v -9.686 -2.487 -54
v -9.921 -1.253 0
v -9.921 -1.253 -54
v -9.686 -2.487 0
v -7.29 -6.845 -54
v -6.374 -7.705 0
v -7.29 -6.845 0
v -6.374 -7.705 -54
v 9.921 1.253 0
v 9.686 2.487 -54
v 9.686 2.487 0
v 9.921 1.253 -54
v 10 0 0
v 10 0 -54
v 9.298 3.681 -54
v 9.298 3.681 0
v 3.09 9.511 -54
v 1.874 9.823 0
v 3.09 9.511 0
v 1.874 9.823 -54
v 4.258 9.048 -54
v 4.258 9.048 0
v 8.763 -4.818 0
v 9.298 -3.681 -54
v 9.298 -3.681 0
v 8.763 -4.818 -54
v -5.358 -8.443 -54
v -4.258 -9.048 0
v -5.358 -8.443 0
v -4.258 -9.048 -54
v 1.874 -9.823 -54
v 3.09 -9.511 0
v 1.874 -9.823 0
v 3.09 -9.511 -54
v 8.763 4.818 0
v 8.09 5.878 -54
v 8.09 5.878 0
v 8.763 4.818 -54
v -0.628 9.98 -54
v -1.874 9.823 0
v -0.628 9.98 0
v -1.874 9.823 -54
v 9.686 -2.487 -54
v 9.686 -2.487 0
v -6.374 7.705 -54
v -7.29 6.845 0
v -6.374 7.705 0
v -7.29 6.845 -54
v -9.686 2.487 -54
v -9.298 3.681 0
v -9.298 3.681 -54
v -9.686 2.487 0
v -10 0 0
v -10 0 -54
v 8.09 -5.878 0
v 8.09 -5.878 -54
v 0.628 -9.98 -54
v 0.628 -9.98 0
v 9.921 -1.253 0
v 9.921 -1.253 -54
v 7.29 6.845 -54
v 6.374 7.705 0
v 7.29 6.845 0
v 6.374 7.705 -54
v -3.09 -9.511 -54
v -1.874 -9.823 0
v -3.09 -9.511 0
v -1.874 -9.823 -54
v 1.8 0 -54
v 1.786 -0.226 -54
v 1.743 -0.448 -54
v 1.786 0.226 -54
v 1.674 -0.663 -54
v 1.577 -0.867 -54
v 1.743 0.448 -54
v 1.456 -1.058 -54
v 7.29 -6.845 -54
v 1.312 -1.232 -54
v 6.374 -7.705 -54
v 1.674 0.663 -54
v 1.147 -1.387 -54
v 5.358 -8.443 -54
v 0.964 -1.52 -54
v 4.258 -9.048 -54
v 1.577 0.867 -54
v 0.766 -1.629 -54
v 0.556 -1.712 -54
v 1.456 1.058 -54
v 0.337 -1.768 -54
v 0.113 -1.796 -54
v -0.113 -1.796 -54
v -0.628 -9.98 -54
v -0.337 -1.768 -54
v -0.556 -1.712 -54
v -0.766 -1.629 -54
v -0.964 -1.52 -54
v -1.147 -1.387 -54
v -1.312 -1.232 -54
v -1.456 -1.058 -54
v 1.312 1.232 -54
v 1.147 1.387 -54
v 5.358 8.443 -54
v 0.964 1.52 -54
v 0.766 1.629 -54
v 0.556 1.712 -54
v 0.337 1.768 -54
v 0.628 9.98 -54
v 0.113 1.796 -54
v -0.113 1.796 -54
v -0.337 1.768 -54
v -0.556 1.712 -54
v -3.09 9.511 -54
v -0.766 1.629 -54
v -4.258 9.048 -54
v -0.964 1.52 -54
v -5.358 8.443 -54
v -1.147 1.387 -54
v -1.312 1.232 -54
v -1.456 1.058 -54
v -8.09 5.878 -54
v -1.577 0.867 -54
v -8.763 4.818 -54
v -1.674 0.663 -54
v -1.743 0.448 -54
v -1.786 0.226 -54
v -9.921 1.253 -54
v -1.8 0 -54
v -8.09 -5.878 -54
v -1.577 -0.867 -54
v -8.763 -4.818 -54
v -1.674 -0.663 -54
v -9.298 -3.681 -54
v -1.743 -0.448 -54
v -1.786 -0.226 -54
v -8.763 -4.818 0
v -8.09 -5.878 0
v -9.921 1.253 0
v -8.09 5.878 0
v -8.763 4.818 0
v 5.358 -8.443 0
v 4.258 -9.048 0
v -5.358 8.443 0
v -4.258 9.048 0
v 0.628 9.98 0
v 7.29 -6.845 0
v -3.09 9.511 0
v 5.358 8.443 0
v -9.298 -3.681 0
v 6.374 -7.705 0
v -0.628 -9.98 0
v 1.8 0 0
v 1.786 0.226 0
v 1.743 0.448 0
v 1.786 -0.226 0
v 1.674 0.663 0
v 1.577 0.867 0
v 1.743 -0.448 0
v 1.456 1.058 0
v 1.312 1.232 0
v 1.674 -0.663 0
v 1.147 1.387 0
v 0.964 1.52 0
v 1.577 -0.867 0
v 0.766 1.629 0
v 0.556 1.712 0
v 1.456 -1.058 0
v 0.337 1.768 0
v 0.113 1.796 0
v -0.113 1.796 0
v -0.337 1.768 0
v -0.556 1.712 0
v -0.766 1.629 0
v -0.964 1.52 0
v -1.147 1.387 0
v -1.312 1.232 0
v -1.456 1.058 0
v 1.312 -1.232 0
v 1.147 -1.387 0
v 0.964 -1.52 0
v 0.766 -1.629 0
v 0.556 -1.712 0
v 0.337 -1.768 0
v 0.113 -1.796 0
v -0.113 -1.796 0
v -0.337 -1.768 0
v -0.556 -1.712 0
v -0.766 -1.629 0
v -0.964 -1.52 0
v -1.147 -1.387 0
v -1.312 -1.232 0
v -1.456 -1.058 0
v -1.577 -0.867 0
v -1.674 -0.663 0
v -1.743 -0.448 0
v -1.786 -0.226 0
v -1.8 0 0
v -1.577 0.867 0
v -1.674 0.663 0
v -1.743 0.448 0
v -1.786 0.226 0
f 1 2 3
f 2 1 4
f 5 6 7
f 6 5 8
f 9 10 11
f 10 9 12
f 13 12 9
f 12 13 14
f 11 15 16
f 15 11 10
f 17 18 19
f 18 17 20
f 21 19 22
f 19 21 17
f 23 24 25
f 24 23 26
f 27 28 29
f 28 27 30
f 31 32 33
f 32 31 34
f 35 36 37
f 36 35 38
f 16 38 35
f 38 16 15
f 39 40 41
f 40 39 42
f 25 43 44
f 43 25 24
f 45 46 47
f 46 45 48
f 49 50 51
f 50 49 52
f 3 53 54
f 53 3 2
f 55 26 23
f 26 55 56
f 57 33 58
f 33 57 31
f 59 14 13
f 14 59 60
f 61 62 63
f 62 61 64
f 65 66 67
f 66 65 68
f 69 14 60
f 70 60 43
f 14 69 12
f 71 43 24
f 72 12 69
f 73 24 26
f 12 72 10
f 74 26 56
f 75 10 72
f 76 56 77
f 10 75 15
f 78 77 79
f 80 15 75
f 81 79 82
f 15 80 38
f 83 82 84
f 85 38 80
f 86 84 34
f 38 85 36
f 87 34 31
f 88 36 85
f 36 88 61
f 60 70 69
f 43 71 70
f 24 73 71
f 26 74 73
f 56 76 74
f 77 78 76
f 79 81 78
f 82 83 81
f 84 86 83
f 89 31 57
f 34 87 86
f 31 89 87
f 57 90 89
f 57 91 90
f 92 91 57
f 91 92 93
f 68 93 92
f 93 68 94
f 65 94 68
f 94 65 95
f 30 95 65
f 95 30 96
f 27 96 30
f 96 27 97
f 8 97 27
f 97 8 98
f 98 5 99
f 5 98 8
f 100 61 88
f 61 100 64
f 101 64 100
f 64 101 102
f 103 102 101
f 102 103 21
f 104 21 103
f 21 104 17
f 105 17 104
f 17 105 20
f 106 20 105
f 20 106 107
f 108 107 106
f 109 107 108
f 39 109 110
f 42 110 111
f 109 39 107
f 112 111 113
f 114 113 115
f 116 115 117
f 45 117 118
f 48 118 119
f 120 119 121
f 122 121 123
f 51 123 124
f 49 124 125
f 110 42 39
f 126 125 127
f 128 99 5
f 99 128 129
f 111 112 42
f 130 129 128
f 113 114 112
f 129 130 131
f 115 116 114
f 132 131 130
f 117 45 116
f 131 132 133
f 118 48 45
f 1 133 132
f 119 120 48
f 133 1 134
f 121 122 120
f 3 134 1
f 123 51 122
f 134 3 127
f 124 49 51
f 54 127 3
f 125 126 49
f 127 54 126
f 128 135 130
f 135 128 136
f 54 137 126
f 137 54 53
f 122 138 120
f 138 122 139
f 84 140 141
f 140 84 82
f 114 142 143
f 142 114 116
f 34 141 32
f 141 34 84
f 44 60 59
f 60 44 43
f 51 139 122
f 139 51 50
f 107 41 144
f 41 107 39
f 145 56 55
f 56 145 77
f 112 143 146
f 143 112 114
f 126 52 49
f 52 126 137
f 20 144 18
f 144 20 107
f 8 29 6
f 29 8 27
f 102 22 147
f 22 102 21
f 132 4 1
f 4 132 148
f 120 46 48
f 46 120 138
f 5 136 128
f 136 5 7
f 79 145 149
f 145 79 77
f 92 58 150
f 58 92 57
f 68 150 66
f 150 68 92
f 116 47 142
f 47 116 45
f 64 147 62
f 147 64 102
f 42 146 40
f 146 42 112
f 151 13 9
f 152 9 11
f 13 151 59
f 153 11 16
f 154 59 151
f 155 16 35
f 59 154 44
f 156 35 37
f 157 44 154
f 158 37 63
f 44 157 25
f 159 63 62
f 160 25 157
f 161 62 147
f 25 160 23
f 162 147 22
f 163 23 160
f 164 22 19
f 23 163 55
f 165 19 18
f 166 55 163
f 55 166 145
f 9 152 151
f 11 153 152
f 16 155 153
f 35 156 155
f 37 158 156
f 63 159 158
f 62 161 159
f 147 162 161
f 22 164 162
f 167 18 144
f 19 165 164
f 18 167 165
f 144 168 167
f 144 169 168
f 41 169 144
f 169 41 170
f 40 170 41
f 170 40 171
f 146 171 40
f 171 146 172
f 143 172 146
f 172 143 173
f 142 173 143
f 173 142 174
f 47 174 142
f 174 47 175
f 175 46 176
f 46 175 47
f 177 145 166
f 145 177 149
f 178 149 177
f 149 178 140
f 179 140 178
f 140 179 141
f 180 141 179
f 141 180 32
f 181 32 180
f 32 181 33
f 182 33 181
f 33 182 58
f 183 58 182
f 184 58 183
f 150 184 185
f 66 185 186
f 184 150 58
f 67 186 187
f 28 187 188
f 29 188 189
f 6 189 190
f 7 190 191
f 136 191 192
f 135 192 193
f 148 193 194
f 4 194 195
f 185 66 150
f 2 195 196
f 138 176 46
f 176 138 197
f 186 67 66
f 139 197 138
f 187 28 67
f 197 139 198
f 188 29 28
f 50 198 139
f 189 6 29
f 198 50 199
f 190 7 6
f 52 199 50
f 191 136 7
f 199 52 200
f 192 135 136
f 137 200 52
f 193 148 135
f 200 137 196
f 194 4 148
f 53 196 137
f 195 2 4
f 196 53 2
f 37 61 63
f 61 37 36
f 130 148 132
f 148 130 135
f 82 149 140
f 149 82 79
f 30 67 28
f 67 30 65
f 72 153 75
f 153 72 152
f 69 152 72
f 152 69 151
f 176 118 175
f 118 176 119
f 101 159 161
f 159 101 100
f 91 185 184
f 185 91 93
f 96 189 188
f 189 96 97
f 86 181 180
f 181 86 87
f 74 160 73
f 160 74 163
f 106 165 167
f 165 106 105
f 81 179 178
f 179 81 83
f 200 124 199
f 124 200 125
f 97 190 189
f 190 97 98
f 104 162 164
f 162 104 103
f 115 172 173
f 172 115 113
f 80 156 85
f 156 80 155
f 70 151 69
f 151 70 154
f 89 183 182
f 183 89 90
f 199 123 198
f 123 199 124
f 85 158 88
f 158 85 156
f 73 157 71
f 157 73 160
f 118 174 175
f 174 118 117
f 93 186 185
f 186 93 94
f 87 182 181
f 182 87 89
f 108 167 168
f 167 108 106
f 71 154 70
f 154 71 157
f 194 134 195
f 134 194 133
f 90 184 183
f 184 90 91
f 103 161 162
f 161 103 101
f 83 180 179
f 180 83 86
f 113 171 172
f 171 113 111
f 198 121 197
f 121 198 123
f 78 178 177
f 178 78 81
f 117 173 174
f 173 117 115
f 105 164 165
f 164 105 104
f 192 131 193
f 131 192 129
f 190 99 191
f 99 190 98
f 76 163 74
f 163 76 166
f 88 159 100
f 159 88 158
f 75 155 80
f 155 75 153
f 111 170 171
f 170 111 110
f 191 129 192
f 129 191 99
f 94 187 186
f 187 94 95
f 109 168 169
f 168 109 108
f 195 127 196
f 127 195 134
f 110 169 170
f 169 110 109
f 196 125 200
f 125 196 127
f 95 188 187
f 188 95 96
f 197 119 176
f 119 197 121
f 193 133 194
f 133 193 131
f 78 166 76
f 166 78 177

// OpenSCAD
$fn = 50;


difference() {
	union() {
		translate(v = [0, 0, -54.0000000000]) {
			cylinder(h = 54, r = 10.0000000000);
		}
		cylinder(h = 0, r = 20.0000000000);
	}
	union() {
		#translate(v = [0, 0, -54]) {
			cylinder(h = 54, r = 1.8000000000);
		}
	}
}
